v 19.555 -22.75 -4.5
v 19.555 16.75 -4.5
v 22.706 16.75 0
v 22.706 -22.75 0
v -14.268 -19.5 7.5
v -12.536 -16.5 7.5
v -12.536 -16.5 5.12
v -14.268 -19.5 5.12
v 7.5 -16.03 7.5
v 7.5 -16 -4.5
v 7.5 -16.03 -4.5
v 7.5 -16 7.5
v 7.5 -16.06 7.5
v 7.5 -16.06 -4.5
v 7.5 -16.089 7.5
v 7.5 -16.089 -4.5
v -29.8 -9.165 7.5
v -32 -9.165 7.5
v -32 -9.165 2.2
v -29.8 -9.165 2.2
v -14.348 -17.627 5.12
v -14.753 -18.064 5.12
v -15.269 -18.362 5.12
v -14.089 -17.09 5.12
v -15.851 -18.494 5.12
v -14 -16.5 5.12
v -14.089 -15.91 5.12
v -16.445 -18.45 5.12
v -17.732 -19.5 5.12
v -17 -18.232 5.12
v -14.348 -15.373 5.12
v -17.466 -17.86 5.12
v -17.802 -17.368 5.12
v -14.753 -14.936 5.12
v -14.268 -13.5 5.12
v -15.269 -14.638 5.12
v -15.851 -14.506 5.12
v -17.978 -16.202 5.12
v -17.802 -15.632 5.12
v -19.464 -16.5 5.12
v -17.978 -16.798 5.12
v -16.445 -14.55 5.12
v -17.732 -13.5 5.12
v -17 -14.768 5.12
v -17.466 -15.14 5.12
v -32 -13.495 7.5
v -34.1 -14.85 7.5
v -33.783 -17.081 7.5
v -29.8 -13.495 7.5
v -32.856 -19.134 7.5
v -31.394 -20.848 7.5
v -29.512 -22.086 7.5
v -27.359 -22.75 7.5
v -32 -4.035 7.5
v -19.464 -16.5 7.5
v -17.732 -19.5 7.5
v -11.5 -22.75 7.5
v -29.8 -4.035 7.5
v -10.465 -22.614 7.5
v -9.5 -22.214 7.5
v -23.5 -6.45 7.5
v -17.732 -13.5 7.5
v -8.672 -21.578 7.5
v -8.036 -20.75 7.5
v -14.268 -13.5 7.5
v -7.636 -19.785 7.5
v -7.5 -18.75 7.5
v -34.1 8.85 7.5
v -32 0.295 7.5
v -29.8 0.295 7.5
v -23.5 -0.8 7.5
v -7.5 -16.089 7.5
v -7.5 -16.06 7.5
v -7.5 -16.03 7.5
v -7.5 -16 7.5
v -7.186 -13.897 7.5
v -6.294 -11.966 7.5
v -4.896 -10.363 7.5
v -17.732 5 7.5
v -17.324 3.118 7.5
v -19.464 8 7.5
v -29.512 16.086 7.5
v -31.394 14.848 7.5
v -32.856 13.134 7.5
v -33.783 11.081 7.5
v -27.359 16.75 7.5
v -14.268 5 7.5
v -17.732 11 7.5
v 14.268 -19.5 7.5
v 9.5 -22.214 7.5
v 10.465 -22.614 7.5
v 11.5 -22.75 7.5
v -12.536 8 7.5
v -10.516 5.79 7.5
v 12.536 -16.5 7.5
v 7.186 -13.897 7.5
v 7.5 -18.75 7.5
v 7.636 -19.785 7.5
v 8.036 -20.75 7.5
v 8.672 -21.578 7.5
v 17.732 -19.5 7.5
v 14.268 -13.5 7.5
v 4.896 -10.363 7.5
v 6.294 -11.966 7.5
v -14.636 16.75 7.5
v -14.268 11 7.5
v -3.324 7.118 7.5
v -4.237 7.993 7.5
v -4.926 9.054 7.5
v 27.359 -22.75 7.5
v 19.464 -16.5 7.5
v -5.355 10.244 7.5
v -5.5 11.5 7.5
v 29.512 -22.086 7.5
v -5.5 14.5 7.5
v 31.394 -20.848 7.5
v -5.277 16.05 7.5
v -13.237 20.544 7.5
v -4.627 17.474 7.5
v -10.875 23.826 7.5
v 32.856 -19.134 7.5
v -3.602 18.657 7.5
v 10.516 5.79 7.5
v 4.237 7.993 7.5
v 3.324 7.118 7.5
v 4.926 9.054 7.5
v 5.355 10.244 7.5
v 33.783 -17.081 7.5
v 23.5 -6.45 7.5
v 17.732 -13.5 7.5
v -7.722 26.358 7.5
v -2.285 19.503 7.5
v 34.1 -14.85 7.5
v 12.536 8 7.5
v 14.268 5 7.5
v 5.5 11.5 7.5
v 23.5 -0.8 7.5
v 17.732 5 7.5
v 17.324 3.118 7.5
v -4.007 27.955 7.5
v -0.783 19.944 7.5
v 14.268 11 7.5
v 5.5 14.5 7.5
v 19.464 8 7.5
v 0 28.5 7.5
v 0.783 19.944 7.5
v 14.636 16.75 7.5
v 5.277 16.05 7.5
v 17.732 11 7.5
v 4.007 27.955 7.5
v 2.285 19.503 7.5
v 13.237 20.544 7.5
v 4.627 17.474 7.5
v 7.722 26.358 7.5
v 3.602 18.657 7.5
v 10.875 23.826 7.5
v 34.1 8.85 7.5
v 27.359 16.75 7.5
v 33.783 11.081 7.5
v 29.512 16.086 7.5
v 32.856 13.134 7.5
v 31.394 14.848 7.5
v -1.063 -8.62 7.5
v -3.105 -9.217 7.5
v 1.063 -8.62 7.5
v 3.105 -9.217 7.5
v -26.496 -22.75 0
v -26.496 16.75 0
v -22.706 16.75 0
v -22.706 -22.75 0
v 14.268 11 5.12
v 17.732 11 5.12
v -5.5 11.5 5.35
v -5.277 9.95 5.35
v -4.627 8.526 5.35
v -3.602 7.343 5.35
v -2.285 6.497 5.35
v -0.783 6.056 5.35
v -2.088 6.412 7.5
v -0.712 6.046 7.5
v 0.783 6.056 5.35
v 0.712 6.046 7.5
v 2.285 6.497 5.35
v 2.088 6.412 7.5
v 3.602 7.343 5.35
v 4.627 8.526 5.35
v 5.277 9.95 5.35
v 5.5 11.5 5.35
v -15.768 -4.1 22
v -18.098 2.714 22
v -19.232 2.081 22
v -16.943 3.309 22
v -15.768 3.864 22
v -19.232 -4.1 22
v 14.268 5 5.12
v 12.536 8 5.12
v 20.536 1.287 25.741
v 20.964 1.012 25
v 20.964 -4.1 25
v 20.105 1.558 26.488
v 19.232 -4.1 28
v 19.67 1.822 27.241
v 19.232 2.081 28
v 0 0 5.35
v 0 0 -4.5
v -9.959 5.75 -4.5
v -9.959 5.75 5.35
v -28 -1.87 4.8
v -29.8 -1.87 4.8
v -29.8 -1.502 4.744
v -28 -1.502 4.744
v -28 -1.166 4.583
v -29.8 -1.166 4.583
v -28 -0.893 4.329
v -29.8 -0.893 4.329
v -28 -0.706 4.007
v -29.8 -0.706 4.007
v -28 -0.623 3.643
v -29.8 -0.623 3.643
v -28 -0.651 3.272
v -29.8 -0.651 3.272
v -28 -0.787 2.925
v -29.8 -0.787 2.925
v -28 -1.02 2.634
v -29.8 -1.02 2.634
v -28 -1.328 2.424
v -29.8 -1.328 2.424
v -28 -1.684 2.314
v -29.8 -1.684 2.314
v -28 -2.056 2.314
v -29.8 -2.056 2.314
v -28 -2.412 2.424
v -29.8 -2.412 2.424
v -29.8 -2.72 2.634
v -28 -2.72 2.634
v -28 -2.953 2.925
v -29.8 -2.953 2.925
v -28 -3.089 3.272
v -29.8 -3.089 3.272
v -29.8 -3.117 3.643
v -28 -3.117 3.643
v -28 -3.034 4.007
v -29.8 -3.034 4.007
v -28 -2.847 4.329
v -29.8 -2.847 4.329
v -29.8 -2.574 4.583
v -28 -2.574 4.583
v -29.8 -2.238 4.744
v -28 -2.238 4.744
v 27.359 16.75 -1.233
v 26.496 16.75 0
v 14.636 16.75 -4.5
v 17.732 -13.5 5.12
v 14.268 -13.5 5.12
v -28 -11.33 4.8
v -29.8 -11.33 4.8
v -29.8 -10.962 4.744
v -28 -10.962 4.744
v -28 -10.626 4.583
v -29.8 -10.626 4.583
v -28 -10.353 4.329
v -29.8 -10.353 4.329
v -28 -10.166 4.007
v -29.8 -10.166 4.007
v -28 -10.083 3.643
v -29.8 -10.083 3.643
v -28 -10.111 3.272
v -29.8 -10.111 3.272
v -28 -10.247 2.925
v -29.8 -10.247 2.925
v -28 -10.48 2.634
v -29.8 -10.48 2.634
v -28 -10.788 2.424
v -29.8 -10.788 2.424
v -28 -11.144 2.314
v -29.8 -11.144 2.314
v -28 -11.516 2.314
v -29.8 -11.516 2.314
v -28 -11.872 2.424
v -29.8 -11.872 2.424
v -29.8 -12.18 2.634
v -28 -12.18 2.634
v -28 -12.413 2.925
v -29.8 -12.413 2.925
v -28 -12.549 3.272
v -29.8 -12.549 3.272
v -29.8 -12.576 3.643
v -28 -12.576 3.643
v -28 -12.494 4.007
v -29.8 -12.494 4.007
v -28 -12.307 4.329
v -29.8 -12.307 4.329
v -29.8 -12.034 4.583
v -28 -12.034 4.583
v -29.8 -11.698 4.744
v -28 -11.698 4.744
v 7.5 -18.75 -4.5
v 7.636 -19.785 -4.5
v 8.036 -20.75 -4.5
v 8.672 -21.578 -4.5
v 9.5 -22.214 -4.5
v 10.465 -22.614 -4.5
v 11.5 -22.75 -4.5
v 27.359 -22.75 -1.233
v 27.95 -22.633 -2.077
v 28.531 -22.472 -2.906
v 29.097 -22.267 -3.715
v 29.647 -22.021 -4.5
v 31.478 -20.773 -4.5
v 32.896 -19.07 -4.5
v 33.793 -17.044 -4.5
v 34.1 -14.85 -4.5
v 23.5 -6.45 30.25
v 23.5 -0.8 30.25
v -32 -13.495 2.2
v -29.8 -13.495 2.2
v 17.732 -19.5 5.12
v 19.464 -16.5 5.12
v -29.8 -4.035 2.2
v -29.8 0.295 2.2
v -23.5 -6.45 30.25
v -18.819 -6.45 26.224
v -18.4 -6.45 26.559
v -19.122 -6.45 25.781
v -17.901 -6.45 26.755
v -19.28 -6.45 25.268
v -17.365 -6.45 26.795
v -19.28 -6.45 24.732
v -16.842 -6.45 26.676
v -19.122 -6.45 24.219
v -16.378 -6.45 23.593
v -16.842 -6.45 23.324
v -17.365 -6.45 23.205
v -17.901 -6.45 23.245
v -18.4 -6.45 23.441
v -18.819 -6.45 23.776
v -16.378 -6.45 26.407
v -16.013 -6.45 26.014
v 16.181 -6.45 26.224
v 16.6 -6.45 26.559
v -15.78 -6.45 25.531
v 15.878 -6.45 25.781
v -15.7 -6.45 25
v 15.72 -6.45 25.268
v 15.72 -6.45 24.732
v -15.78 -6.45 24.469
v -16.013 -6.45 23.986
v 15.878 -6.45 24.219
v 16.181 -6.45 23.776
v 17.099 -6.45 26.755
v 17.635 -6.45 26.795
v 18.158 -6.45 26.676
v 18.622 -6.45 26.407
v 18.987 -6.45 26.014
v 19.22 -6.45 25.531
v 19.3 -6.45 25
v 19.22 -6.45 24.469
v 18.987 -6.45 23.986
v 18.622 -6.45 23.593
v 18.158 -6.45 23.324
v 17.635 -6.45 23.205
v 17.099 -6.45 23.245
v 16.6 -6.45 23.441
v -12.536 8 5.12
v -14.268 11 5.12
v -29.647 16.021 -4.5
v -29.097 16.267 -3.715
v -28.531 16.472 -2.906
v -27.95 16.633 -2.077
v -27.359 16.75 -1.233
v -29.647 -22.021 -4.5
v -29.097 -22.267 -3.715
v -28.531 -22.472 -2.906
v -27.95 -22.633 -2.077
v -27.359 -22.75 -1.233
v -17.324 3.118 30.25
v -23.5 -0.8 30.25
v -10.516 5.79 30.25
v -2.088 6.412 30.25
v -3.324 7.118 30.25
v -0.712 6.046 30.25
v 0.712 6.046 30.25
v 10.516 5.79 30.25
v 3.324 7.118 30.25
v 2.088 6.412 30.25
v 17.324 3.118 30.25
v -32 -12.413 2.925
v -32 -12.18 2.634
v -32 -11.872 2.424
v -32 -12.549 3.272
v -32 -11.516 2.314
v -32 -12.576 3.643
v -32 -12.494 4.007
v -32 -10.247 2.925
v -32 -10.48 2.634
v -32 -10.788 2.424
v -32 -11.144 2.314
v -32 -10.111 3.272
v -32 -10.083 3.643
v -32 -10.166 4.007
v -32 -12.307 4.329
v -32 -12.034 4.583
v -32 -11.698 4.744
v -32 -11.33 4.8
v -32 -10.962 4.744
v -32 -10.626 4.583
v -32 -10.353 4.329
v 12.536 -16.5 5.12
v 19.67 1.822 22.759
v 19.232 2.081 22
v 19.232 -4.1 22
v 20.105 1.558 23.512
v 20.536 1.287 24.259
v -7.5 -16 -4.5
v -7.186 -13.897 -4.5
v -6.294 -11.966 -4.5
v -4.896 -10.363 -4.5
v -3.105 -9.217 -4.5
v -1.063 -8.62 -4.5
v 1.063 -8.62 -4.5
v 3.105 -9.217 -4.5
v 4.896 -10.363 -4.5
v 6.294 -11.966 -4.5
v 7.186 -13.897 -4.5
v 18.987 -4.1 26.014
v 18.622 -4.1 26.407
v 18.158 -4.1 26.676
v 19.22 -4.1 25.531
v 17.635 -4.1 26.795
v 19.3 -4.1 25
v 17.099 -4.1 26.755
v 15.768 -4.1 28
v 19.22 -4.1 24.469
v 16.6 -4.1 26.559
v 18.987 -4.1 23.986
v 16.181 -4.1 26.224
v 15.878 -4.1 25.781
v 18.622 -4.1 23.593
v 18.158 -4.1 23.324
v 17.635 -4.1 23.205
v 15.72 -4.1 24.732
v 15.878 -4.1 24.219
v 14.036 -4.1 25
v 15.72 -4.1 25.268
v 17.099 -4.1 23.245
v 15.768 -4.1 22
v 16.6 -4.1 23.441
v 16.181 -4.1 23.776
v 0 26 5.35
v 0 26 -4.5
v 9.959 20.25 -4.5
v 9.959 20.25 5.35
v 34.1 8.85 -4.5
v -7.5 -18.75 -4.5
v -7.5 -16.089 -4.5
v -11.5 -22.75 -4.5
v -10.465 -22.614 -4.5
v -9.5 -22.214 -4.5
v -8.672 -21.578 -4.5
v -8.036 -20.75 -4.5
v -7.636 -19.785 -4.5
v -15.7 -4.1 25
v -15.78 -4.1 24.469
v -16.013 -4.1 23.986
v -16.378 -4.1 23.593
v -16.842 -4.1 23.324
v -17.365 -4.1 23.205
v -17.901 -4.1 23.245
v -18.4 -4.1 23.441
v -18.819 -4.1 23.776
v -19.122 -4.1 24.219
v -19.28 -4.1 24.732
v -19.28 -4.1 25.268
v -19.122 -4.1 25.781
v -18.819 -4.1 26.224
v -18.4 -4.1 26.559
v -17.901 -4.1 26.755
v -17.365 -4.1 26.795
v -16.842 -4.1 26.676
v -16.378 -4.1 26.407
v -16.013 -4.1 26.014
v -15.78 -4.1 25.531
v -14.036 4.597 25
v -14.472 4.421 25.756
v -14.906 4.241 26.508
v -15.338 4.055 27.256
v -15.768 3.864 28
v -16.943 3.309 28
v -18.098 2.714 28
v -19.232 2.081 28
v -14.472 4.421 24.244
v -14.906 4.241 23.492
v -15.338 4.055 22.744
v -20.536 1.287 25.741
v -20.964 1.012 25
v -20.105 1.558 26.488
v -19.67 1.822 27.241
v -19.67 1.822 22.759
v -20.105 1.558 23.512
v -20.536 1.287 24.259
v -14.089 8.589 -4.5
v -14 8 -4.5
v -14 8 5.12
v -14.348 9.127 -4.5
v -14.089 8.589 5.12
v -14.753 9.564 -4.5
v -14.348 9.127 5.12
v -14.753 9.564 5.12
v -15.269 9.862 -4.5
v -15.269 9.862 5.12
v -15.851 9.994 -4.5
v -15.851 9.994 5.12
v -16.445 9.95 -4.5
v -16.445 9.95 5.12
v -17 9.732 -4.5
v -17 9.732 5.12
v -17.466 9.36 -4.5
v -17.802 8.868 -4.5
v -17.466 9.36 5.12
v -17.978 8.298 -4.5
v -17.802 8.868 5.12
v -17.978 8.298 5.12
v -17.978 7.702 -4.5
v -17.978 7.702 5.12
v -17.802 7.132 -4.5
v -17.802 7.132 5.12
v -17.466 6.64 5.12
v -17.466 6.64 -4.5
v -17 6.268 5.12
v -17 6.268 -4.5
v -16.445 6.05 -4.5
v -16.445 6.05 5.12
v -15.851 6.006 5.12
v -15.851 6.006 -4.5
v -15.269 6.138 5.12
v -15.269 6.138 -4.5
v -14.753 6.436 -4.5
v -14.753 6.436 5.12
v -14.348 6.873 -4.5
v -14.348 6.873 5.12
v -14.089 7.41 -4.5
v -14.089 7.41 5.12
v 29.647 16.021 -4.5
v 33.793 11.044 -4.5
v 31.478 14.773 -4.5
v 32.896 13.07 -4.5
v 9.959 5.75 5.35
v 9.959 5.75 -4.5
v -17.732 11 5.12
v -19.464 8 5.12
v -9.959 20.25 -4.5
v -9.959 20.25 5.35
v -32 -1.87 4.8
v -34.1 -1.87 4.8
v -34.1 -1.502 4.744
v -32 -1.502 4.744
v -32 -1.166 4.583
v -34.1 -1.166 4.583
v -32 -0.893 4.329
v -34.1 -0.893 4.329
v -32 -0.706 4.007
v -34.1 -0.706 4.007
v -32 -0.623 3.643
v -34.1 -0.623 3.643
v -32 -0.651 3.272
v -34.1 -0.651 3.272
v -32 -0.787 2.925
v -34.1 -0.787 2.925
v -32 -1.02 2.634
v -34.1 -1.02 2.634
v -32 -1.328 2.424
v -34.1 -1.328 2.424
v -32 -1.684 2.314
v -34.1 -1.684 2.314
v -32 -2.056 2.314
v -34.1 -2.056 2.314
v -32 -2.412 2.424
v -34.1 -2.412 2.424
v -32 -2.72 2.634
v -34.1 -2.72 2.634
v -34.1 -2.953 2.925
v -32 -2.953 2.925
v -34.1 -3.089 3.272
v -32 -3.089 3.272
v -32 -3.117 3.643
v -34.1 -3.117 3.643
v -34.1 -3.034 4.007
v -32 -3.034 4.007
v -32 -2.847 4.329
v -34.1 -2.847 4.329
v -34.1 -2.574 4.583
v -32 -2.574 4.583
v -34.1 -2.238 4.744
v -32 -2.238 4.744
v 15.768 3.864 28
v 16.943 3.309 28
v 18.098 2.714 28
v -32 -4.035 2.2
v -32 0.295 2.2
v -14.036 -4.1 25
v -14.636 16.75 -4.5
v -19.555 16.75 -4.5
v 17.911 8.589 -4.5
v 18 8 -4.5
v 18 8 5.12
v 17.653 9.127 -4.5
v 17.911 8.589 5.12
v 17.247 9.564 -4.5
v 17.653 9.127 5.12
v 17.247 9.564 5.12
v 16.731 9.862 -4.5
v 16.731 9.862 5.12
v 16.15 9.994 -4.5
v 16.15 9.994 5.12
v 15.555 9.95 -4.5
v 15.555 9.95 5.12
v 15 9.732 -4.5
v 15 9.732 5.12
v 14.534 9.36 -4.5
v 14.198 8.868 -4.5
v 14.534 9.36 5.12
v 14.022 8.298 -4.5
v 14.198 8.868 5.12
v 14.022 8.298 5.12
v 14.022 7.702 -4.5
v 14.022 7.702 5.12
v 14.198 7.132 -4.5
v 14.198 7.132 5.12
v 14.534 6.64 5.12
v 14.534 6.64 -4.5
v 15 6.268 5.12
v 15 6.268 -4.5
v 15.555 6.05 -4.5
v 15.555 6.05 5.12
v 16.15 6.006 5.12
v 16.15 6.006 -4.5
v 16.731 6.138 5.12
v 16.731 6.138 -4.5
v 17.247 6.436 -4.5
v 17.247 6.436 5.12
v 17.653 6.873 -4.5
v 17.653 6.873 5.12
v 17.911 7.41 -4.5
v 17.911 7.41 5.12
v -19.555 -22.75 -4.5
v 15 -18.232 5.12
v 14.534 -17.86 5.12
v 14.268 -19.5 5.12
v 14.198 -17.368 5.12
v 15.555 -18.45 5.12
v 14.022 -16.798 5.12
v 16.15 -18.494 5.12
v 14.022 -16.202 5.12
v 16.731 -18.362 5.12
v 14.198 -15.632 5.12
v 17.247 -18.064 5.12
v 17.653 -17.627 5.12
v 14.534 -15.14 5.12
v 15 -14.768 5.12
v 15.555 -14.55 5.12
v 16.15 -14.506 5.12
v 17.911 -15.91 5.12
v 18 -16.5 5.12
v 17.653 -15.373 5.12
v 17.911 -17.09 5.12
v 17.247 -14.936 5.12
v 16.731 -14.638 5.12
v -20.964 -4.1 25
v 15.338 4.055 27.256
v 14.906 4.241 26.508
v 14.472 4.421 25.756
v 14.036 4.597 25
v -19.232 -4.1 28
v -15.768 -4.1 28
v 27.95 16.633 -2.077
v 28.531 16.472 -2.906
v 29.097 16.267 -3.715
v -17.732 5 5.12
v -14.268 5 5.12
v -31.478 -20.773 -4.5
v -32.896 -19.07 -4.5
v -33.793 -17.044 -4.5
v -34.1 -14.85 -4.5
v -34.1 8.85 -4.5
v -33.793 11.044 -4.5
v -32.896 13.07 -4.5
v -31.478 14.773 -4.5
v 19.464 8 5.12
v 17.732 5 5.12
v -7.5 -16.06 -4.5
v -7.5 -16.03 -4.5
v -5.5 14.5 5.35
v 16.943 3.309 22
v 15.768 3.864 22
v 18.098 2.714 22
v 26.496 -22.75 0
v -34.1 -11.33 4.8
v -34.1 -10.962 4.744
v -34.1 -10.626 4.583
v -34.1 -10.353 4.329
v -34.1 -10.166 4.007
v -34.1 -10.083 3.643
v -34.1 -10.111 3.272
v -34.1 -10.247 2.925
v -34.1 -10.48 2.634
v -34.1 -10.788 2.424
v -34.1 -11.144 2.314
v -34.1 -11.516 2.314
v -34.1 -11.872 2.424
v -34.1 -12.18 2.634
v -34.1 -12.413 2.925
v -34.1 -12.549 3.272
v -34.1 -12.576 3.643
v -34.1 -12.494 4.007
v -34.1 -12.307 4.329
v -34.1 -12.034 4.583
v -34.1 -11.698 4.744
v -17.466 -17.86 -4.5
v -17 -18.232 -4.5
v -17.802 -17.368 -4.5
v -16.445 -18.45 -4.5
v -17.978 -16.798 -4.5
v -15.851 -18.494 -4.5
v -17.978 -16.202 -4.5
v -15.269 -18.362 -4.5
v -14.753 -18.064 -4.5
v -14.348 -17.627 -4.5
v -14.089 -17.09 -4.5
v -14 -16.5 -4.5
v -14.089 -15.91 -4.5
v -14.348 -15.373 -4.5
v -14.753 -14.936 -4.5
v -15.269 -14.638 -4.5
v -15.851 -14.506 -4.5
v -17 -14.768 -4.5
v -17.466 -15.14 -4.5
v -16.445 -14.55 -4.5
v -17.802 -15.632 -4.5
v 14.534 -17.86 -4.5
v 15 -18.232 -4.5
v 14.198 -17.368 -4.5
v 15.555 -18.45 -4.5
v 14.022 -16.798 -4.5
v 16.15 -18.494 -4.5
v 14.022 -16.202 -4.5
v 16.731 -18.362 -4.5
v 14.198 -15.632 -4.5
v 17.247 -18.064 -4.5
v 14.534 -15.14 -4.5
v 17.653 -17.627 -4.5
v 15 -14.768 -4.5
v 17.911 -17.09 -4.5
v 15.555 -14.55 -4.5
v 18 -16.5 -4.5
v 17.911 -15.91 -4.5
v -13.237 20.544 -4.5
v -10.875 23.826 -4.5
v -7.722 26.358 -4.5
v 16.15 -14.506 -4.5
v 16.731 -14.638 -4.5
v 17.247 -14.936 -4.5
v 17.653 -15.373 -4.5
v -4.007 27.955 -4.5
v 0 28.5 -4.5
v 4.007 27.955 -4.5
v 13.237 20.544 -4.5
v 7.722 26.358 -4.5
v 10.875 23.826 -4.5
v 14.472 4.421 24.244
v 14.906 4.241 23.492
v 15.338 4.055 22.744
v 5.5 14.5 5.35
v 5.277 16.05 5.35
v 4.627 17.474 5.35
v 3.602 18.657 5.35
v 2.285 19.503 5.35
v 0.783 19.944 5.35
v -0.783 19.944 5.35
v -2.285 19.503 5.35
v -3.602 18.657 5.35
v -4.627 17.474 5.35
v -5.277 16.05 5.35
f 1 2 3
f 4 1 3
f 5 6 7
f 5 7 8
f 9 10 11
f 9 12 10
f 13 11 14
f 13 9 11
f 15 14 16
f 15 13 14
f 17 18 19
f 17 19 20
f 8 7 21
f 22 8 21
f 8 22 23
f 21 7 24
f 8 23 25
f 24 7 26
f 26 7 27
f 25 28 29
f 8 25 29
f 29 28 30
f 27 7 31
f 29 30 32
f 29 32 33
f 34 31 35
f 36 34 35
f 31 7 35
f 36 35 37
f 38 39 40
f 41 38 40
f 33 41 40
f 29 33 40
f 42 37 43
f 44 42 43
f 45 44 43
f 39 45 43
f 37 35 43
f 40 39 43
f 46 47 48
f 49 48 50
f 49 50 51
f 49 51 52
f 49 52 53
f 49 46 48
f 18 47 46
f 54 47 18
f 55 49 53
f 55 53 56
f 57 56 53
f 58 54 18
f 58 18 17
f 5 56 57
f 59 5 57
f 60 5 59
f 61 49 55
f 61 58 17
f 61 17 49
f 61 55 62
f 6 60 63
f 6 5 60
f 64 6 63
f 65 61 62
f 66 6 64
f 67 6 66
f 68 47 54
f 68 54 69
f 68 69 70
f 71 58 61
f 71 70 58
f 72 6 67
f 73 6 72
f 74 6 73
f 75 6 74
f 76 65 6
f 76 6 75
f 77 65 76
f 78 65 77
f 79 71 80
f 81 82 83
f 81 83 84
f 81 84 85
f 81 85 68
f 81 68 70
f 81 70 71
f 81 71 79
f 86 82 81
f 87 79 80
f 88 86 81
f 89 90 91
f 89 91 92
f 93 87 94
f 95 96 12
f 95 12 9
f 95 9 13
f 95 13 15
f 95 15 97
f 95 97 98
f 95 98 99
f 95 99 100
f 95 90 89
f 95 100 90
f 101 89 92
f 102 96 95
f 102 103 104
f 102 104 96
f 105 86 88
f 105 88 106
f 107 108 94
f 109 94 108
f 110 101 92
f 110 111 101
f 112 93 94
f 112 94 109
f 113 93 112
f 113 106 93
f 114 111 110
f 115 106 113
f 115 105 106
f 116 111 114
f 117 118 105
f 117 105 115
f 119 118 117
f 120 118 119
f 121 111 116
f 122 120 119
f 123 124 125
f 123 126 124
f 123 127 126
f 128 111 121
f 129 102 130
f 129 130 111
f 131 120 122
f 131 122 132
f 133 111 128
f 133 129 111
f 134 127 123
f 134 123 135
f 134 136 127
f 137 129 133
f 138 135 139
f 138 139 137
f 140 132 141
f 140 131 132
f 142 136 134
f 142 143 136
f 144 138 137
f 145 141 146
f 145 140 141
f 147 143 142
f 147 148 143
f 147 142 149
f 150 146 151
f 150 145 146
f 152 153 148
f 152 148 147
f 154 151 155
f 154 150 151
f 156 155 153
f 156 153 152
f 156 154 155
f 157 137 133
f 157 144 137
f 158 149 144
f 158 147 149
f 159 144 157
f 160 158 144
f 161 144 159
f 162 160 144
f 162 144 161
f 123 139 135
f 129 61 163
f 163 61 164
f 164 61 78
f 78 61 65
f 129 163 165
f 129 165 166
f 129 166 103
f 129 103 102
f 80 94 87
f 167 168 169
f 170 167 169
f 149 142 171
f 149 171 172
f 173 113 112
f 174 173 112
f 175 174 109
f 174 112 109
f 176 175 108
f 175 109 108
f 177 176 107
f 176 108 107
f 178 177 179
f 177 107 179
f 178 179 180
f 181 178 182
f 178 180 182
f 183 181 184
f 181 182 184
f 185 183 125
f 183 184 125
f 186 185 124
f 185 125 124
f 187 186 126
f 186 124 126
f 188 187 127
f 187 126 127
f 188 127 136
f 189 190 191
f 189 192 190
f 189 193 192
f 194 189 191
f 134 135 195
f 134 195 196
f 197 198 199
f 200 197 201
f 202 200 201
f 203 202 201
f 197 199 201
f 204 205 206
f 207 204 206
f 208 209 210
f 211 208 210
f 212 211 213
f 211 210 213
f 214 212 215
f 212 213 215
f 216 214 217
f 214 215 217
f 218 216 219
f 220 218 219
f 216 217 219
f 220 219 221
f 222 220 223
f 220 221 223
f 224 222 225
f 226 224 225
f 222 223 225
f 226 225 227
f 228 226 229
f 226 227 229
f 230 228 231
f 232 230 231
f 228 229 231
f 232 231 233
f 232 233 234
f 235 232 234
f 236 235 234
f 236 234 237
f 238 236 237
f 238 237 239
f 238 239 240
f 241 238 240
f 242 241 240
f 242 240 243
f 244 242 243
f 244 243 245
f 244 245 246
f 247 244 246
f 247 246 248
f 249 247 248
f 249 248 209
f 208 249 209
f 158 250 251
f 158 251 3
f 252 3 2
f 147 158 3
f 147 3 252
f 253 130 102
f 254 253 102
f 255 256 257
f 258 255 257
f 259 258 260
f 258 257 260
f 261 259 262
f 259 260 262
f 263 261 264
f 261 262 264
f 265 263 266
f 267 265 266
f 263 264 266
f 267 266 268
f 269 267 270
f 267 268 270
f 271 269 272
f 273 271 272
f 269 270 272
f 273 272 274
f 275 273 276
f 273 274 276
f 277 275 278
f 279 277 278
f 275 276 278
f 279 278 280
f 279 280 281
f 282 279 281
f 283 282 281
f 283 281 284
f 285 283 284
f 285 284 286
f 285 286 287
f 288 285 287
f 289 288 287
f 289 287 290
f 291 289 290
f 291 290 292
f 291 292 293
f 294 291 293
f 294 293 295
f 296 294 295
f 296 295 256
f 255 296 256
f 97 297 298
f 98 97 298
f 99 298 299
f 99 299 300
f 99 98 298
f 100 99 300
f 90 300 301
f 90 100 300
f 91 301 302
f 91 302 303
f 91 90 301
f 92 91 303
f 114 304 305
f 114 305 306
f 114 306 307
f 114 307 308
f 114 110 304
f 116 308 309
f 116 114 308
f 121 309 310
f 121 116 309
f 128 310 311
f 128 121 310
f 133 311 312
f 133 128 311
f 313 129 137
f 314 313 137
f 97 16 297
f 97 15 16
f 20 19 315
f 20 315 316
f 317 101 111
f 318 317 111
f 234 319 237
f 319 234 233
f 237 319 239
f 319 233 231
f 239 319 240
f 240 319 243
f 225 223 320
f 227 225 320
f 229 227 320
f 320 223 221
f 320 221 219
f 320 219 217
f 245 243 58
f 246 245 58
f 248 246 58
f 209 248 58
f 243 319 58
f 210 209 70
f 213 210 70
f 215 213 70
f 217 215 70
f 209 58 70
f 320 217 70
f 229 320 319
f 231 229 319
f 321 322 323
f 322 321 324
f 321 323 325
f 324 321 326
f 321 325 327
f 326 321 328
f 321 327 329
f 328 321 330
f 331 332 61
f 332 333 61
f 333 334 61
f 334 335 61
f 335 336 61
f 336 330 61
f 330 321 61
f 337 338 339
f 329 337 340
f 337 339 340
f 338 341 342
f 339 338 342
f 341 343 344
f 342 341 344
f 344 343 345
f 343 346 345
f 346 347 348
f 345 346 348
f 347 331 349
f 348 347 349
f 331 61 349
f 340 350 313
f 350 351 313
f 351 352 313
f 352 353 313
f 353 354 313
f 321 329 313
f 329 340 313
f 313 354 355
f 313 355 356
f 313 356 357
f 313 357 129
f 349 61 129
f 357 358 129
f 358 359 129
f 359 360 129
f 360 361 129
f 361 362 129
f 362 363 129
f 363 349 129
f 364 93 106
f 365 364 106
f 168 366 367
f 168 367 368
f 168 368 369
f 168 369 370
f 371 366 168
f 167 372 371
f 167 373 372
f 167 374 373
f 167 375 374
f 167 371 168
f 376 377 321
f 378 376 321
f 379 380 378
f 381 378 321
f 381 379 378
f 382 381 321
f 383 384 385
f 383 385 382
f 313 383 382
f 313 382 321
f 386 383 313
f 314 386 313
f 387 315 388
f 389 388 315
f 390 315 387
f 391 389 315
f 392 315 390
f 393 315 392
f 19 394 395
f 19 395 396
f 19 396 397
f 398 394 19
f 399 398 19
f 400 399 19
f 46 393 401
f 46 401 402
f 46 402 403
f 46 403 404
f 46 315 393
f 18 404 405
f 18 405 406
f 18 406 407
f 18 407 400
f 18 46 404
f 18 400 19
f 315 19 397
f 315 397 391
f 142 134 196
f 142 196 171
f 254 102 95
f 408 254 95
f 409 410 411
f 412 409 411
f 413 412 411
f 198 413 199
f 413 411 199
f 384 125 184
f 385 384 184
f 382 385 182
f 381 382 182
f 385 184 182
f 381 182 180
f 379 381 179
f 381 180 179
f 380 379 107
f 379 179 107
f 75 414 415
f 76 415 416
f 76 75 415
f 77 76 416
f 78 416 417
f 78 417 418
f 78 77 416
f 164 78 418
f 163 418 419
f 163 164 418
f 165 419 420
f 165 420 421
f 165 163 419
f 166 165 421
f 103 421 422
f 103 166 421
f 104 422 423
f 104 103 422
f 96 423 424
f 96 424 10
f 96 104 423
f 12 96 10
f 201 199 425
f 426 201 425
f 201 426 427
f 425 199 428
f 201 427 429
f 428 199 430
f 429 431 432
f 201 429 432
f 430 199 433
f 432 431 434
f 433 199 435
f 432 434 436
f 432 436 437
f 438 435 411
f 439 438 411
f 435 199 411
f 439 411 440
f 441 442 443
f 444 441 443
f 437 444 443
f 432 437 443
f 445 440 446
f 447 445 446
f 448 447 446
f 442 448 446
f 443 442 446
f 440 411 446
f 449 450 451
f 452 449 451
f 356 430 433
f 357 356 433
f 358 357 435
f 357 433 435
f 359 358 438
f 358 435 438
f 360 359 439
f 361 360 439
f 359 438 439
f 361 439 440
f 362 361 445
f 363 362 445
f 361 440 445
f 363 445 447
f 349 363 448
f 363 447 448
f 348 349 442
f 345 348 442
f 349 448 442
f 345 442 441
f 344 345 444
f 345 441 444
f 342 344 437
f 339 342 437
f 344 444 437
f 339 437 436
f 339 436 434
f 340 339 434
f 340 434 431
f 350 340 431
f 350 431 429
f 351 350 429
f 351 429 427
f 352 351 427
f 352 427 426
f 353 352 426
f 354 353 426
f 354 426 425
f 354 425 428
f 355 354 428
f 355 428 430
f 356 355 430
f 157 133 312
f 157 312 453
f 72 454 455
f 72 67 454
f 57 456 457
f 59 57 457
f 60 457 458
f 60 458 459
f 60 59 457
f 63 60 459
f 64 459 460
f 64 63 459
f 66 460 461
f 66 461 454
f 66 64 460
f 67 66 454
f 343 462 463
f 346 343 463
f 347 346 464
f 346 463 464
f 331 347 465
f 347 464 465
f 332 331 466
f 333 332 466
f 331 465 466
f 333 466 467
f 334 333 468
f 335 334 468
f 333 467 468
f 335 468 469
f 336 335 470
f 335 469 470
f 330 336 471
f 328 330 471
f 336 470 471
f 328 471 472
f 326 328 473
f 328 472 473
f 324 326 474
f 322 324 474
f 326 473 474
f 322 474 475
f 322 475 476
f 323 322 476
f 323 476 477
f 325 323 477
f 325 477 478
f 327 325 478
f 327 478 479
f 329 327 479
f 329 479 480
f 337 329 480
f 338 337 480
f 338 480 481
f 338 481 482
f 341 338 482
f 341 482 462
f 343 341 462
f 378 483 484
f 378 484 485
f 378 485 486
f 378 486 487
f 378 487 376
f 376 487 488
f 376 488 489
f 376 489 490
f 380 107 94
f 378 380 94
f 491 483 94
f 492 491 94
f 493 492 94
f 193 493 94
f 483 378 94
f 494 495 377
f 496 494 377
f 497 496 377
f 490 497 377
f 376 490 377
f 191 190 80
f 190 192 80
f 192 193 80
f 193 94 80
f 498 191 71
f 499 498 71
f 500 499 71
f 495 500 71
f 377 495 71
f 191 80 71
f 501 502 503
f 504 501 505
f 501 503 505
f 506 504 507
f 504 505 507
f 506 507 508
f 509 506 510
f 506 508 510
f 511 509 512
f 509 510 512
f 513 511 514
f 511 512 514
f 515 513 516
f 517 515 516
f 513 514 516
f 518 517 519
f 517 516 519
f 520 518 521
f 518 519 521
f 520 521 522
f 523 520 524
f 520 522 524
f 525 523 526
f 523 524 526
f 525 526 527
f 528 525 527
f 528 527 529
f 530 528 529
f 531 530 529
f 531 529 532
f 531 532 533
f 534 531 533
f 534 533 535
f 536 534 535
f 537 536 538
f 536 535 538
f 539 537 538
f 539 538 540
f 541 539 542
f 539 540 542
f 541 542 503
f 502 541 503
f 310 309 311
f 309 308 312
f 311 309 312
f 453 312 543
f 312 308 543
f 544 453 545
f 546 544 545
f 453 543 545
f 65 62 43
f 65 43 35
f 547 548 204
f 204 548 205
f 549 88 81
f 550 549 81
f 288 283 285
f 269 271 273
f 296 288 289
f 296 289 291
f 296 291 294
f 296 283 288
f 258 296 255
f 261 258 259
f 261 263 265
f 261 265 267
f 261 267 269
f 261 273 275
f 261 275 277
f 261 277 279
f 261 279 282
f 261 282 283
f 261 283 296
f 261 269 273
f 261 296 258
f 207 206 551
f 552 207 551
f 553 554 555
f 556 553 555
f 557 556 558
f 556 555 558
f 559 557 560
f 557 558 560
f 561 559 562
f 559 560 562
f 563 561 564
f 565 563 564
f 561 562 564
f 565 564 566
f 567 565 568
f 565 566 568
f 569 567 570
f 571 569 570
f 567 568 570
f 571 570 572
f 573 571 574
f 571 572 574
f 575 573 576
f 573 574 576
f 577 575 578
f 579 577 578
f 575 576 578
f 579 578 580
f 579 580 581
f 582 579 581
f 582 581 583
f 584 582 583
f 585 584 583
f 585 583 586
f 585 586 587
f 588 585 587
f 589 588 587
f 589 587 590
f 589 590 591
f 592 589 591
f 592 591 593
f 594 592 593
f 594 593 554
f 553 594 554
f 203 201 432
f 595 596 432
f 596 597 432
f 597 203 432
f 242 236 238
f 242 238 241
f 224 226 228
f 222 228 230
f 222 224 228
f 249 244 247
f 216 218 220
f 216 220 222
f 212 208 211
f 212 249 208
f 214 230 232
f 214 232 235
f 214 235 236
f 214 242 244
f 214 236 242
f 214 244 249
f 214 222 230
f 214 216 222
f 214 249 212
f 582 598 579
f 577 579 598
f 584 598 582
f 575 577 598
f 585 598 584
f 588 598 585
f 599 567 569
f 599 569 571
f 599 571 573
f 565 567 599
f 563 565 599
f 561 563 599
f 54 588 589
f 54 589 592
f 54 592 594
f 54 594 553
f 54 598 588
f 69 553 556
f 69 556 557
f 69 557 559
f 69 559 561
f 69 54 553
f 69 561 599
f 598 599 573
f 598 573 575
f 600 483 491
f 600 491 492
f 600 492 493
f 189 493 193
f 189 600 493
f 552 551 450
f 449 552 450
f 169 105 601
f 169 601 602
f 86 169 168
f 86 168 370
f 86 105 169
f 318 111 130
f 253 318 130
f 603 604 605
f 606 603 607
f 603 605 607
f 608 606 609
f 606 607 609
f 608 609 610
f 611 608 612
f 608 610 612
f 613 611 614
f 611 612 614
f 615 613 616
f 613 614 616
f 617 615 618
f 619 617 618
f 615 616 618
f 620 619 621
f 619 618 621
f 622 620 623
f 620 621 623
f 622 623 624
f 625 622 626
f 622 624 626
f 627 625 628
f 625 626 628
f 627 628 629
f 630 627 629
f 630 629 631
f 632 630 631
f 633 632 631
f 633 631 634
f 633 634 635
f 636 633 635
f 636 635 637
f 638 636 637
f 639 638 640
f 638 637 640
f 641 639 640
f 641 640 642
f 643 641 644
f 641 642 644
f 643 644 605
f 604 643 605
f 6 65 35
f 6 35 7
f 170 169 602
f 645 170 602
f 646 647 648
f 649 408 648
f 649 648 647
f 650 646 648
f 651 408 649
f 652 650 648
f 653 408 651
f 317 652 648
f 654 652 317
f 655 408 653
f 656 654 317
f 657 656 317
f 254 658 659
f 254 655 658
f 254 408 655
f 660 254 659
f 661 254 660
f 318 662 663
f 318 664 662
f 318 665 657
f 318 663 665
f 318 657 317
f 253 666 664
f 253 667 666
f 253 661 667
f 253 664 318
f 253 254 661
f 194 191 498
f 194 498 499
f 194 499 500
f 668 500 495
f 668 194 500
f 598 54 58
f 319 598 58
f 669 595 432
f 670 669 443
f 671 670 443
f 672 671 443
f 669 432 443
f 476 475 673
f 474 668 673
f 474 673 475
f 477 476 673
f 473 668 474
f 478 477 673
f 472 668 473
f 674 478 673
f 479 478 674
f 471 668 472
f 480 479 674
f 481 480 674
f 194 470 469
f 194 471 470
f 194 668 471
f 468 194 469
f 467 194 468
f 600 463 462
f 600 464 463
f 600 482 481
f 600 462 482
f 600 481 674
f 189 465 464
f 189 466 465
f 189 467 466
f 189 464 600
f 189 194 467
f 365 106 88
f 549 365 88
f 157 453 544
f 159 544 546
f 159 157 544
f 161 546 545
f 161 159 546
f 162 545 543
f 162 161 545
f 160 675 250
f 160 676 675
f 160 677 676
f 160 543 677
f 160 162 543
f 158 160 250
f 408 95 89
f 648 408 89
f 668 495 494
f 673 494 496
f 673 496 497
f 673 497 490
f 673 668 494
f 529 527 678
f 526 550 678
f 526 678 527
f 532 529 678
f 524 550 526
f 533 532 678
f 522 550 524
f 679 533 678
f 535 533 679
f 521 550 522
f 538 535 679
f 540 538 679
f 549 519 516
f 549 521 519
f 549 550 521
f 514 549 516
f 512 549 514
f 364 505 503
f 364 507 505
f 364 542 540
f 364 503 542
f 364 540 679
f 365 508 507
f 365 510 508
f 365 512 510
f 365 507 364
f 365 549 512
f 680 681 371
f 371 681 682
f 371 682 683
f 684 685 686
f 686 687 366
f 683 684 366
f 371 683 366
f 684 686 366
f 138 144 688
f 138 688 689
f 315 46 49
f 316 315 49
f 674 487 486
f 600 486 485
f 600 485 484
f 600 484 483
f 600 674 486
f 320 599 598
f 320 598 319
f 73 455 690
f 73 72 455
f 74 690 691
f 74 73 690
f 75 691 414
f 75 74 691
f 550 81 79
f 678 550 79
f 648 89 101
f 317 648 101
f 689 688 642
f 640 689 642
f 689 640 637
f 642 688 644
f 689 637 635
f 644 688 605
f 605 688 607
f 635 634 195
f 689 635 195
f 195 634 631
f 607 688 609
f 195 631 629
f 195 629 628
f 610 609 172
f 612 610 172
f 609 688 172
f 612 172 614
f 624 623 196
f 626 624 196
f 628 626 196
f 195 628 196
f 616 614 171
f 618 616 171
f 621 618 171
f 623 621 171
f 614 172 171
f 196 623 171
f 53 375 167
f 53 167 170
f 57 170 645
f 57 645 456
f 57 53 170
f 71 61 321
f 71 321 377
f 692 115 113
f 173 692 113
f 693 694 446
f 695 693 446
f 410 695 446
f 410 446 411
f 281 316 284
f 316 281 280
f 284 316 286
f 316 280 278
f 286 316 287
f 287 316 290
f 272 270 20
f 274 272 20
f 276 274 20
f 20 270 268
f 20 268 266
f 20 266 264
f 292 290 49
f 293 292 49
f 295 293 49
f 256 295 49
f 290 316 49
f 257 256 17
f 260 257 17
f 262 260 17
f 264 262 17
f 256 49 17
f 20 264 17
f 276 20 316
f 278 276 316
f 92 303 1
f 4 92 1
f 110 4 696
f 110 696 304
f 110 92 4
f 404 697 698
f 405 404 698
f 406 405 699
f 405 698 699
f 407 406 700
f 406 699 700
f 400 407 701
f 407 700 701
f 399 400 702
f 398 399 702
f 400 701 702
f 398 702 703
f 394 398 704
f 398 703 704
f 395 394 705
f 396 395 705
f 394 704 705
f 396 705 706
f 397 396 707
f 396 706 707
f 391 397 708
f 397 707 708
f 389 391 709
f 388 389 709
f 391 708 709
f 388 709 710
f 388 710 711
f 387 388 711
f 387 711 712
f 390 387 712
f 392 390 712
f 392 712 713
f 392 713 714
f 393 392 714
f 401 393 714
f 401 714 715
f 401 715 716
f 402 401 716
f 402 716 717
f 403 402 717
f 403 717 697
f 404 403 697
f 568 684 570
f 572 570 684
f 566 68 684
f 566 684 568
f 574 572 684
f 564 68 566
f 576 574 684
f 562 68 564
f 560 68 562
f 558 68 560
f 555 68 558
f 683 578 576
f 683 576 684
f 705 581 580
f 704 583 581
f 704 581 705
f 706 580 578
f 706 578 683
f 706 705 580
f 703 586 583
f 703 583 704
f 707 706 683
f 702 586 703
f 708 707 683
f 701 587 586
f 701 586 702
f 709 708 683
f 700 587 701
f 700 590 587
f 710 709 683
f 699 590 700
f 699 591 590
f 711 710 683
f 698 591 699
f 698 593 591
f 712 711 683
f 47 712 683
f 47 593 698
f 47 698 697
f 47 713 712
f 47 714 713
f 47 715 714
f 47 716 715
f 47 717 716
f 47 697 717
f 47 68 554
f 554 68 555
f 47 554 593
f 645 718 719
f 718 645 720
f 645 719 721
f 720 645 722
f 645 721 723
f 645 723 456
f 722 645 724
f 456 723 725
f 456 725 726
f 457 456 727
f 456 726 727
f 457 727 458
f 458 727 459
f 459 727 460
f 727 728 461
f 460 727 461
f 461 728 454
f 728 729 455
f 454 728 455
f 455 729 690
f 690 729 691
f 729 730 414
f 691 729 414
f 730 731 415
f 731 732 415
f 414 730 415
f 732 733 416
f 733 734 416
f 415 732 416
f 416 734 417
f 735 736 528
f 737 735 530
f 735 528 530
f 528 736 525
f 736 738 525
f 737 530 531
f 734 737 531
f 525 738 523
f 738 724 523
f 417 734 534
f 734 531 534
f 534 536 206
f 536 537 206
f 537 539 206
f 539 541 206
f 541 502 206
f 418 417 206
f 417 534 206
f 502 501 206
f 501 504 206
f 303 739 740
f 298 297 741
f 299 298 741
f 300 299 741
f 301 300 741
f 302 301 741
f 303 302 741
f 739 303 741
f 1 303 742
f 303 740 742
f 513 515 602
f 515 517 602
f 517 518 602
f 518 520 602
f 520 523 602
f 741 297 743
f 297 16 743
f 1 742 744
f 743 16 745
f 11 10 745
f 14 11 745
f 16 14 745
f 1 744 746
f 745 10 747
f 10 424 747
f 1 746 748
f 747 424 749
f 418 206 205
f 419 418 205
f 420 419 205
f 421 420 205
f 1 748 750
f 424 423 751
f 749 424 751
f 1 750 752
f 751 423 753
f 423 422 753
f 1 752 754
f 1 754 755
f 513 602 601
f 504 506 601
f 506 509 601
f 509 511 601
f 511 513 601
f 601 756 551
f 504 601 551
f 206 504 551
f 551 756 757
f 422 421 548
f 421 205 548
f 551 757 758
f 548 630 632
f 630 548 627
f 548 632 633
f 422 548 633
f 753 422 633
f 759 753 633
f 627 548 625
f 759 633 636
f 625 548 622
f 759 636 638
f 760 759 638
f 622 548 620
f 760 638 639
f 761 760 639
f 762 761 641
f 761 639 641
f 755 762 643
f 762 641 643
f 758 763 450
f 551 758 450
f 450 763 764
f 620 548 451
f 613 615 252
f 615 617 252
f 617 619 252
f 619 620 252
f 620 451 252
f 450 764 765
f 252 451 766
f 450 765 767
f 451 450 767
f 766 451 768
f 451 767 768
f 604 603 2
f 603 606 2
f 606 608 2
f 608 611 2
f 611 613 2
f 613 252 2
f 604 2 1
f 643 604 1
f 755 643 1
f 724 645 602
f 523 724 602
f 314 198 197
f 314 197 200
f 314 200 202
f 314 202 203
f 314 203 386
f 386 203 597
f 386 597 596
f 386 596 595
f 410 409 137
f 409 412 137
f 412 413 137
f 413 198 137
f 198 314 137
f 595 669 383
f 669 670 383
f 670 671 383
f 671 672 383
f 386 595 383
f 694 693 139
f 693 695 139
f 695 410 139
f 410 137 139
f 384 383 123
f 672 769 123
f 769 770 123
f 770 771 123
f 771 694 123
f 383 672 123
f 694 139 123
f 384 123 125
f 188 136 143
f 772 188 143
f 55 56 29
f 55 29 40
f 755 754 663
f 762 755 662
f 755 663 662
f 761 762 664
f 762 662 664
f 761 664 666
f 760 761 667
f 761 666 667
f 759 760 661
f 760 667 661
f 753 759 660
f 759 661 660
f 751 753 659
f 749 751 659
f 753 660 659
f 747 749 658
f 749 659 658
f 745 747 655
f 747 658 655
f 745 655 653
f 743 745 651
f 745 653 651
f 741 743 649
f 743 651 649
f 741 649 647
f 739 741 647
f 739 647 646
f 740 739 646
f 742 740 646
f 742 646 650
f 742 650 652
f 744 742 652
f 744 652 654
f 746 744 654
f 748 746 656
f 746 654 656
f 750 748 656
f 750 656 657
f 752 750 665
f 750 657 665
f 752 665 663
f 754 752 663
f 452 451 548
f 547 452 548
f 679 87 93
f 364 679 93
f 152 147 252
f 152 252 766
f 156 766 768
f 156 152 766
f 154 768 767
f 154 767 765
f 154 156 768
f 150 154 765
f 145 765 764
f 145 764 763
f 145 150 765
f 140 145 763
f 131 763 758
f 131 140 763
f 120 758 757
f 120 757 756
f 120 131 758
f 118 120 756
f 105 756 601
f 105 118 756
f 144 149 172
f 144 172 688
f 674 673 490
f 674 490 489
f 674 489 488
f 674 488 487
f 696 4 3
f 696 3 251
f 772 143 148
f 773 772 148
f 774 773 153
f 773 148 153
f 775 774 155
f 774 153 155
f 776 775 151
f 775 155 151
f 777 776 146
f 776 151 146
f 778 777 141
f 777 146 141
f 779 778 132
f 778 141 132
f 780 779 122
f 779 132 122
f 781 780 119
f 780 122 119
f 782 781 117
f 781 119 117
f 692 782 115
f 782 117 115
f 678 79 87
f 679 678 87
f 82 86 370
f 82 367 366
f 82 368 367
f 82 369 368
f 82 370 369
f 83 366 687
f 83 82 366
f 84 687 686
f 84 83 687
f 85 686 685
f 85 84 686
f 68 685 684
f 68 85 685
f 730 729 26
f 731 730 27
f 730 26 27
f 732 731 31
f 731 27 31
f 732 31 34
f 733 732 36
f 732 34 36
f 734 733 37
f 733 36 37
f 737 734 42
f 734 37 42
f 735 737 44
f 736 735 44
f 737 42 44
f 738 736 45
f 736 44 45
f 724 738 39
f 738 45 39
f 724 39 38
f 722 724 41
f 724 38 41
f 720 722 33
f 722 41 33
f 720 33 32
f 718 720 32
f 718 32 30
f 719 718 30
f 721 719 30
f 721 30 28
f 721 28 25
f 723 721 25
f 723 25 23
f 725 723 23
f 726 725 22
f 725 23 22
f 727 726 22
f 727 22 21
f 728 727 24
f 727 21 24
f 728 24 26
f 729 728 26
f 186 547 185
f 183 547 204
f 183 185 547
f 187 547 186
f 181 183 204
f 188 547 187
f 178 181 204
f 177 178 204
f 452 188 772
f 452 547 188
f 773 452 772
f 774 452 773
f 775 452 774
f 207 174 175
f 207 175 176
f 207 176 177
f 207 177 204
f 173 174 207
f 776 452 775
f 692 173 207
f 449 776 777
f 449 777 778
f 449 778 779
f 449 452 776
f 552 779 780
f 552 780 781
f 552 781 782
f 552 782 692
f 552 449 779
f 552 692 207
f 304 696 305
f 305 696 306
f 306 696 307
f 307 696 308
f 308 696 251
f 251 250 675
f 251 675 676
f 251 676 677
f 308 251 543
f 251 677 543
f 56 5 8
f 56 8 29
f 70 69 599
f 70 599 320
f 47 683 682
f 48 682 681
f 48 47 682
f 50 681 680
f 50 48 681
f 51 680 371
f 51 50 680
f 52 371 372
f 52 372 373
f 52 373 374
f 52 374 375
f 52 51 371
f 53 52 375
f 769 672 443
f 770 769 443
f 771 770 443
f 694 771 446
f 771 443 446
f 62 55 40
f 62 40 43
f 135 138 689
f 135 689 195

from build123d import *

# Parameters (mm, degrees)
SKETCH1_R                = 2.000043321
SKETCH1_R_2              = 2.000014119
BOSS_EXTRUDE1_DEPTH      = 7.5
BOSS_EXTRUDE1_DEPTH_BACK = 4.5
CUT_EXTRUDE2_DEPTH       = 13
SKETCH3_R                = 2.000014119
SKETCH3_R_2              = 2.000043321
CUT_EXTRUDE3_DEPTH       = 2.38
SKETCH6_W                = 47
SKETCH6_H                = 5.65
BOSS_EXTRUDE2_DEPTH      = 22.75
SKETCH9_R                = 1.8
CUT_EXTRUDE5_DEPTH       = 22.75
CUT_EXTRUDE5_DEPTH_BACK  = 23.750023286
CUT_EXTRUDE6_DEPTH       = 22.75
CUT_EXTRUDE6_DEPTH_BACK  = 4.1004
SKETCH11_R               = 1.250008473
SKETCH11_R_2             = 1.24999389
CUT_EXTRUDE8_DEPTH       = 6.1
SKETCH13_W               = 2.2
SKETCH13_H               = 4.330124
SKETCH13_H_2             = 4.33016
CUT_EXTRUDE9_DEPTH       = 5.3
CUT_EXTRUDE10_DEPTH      = 9.85


with BuildPart() as part:
    # Sketch1 → Boss-Extrude1 (new body, two sides)
    with BuildSketch(Plane.XY) as boss_extrude1_sk:
        with BuildLine():
            ThreePointArc((27.3591, -22.750023286), (32.18573506, -20.04264062), (34.100000001, -14.850154064))
            Line((34.100000001, -14.850154064), (34.100000001, 8.850156137))
            ThreePointArc((34.100000001, 8.850156137), (32.18573506, 14.042642693), (27.3591, 16.750025358))
            Line((27.3591, 16.750025358), (14.6356, 16.750025358))
            ThreePointArc((14.6356, 16.750025358), (0, 28.500025358), (-14.6356, 16.750025358))
            Line((-14.6356, 16.750025358), (-27.3591, 16.750025358))
            ThreePointArc((-27.3591, 16.750025358), (-32.18573506, 14.042642693), (-34.100000001, 8.850156137))
            Line((-34.100000001, 8.850156137), (-34.100000001, -14.850154064))
            ThreePointArc((-34.100000001, -14.850154064), (-32.18573506, -20.04264062), (-27.3591, -22.750023286))
            Line((-27.3591, -22.750023286), (-11.500037792, -22.750023286))
            ThreePointArc((-11.500037792, -22.750023286), (-8.671570628, -21.578433826), (-7.499981167, -18.749966661))
            Line((-7.499981167, -18.749966661), (-7.499981167, -16.089239323))
            ThreePointArc((-7.499981167, -16.089239323), (-7.500113179, -16.044739987), (-7.499981167, -16.000240651))
            ThreePointArc((-7.499981167, -16.000240651), (0, -8.544626807), (7.499981167, -16.000240651))
            ThreePointArc((7.499981167, -16.000240651), (7.500113179, -16.044739987), (7.499981167, -16.089239323))
            Line((7.499981167, -16.089239323), (7.499981167, -18.749966661))
            ThreePointArc((7.499981167, -18.749966661), (8.671570628, -21.578433826), (11.500037792, -22.750023286))
            Line((11.500037792, -22.750023286), (27.3591, -22.750023286))
        make_face()
        with Locations((-16.000068831, -16.5)):
            Circle(SKETCH1_R, mode=Mode.SUBTRACT)
        with Locations((16.000068831, -16.5)):
            Circle(SKETCH1_R, mode=Mode.SUBTRACT)
        with Locations((-16.000068831, 7.999981023)):
            Circle(SKETCH1_R_2, mode=Mode.SUBTRACT)
        with Locations((16.000068831, 7.999981023)):
            Circle(SKETCH1_R_2, mode=Mode.SUBTRACT)
    extrude(amount=BOSS_EXTRUDE1_DEPTH)
    extrude(boss_extrude1_sk.sketch, amount=-BOSS_EXTRUDE1_DEPTH_BACK)

    # Sketch4 → Cut-Extrude2 (cut, through all)
    with BuildSketch(Plane.XY.offset(7.5)):
        with BuildLine():
            Line((5.5, 11.5), (5.5, 14.5))
            ThreePointArc((5.5, 14.5), (0, 20), (-5.5, 14.5))
            Line((-5.5, 14.5), (-5.5, 11.5))
            ThreePointArc((-5.5, 11.5), (0, 6), (5.5, 11.5))
        make_face()
    extrude(amount=-CUT_EXTRUDE2_DEPTH, mode=Mode.SUBTRACT)

    # Sketch3 → Cut-Extrude3 (cut)
    with BuildSketch(Plane.XY.offset(7.5)):
        Polygon((-14.268018024, 10.999981023), (-17.732119639, 10.999981023), (-19.464170446, 7.999981023), (-17.732119639, 4.999981023), (-14.268018024, 4.999981023), (-12.535967216, 7.999981023), align=None)
        with Locations((-16.000068831, 7.999981023)):
            Circle(SKETCH3_R, mode=Mode.SUBTRACT)
        Polygon((14.268018024, 10.999981023), (17.732119639, 10.999981023), (19.464170446, 7.999981023), (17.732119639, 4.999981023), (14.268018024, 4.999981023), (12.535967216, 7.999981023), align=None)
        with Locations((16.000068831, 7.999981023)):
            Circle(SKETCH3_R, mode=Mode.SUBTRACT)
        Polygon((-14.268018024, -19.500018977), (-17.732119639, -19.500018977), (-19.464170446, -16.500018977), (-17.732119639, -13.500018977), (-14.268018024, -13.500018977), (-12.535967216, -16.500018977), align=None)
        with Locations((-16.000068831, -16.5)):
            Circle(SKETCH3_R_2, mode=Mode.SUBTRACT)
        Polygon((12.535967216, -16.500018977), (14.268018024, -19.500018977), (17.732119639, -19.500018977), (19.464170446, -16.500018977), (17.732119639, -13.500018977), (14.268018024, -13.500018977), align=None)
        with Locations((16.000068831, -16.5)):
            Circle(SKETCH3_R_2, mode=Mode.SUBTRACT)
    extrude(amount=-CUT_EXTRUDE3_DEPTH, mode=Mode.SUBTRACT)

    # Sketch6 → Boss-Extrude2 (add)
    with BuildSketch(Plane.XY.offset(7.5)):
        with Locations((0, -3.625)):
            Rectangle(SKETCH6_W, SKETCH6_H)
        with BuildLine():
            Line((-23.5, -0.8), (23.5, -0.8))
            ThreePointArc((23.5, -0.8), (13.984131025, 4.616883926), (3.324005419, 7.118106805))
            ThreePointArc((3.324005419, 7.118106805), (0, 6), (-3.324005419, 7.118106805))
            ThreePointArc((-3.324005419, 7.118106805), (-13.984131025, 4.616883926), (-23.5, -0.8))
        make_face()
    extrude(amount=BOSS_EXTRUDE2_DEPTH)

    # Sketch9 → Cut-Extrude5 (cut, two sides)
    with BuildSketch(Plane(origin=(0, 0, 0), x_dir=(1, 0, 0), z_dir=(0, 1, 0))) as cut_extrude5_sk:
        Polygon((19.555132158, 4.5), (22.70606608, 0), (26.49606608, 0), (29.647000001, 4.5), align=None)
        Polygon((-19.555132158, 4.5), (-29.647000001, 4.5), (-26.49606608, 0), (-22.70606608, 0), align=None)
        with Locations((17.5, -25)):
            Circle(SKETCH9_R)
        with Locations((-17.5, -25)):
            Circle(SKETCH9_R)
    extrude(amount=CUT_EXTRUDE5_DEPTH, mode=Mode.SUBTRACT)
    extrude(cut_extrude5_sk.sketch, amount=-CUT_EXTRUDE5_DEPTH_BACK, mode=Mode.SUBTRACT)

    # Sketch9_7 → Cut-Extrude6 (cut, two sides)
    with BuildSketch(Plane(origin=(0, 0, 0), x_dir=(1, 0, 0), z_dir=(0, 1, 0))) as cut_extrude6_sk:
        Polygon((-19.232050808, -22), (-20.964101615, -25), (-19.232050808, -28), (-15.767949192, -28), (-14.035898385, -25), (-15.767949192, -22), align=None)
        Polygon((20.964101615, -25), (19.232050808, -28), (15.767949192, -28), (14.035898385, -25), (15.767949192, -22), (19.232050808, -22), align=None)
    extrude(amount=CUT_EXTRUDE6_DEPTH, mode=Mode.SUBTRACT)
    extrude(cut_extrude6_sk.sketch, amount=-CUT_EXTRUDE6_DEPTH_BACK, mode=Mode.SUBTRACT)

    # Sketch11 → Cut-Extrude8 (cut)
    with BuildSketch(Plane.ZY.offset(34.100000001)):
        with Locations((3.549979666, -1.86999177)):
            Circle(SKETCH11_R)
        with Locations((3.549979666, -11.329991983)):
            Circle(SKETCH11_R_2)
    extrude(amount=-CUT_EXTRUDE8_DEPTH, mode=Mode.SUBTRACT)

    # Sketch13 → Cut-Extrude9 (cut)
    with BuildSketch(Plane.XY.offset(7.5)):
        with Locations((-30.9, -1.869998)):
            Rectangle(SKETCH13_W, SKETCH13_H)
        with Locations((-30.9, -11.33002)):
            Rectangle(SKETCH13_W, SKETCH13_H_2)
    extrude(amount=-CUT_EXTRUDE9_DEPTH, mode=Mode.SUBTRACT)

    # Sketch15 → Cut-Extrude10 (cut)
    with BuildSketch(Plane(origin=(0, 0, -4.5), x_dir=(-1, 0, 0), z_dir=(0, 0, -1))):
        Polygon((-7.2e-08, 26), (-9.95929, 20.25), (-9.95929, 5.75), (7.2e-08, 1.24e-07), (9.95929, 5.75), (9.95929, 20.25), align=None)
    extrude(amount=-CUT_EXTRUDE10_DEPTH, mode=Mode.SUBTRACT)


solid = part.part
